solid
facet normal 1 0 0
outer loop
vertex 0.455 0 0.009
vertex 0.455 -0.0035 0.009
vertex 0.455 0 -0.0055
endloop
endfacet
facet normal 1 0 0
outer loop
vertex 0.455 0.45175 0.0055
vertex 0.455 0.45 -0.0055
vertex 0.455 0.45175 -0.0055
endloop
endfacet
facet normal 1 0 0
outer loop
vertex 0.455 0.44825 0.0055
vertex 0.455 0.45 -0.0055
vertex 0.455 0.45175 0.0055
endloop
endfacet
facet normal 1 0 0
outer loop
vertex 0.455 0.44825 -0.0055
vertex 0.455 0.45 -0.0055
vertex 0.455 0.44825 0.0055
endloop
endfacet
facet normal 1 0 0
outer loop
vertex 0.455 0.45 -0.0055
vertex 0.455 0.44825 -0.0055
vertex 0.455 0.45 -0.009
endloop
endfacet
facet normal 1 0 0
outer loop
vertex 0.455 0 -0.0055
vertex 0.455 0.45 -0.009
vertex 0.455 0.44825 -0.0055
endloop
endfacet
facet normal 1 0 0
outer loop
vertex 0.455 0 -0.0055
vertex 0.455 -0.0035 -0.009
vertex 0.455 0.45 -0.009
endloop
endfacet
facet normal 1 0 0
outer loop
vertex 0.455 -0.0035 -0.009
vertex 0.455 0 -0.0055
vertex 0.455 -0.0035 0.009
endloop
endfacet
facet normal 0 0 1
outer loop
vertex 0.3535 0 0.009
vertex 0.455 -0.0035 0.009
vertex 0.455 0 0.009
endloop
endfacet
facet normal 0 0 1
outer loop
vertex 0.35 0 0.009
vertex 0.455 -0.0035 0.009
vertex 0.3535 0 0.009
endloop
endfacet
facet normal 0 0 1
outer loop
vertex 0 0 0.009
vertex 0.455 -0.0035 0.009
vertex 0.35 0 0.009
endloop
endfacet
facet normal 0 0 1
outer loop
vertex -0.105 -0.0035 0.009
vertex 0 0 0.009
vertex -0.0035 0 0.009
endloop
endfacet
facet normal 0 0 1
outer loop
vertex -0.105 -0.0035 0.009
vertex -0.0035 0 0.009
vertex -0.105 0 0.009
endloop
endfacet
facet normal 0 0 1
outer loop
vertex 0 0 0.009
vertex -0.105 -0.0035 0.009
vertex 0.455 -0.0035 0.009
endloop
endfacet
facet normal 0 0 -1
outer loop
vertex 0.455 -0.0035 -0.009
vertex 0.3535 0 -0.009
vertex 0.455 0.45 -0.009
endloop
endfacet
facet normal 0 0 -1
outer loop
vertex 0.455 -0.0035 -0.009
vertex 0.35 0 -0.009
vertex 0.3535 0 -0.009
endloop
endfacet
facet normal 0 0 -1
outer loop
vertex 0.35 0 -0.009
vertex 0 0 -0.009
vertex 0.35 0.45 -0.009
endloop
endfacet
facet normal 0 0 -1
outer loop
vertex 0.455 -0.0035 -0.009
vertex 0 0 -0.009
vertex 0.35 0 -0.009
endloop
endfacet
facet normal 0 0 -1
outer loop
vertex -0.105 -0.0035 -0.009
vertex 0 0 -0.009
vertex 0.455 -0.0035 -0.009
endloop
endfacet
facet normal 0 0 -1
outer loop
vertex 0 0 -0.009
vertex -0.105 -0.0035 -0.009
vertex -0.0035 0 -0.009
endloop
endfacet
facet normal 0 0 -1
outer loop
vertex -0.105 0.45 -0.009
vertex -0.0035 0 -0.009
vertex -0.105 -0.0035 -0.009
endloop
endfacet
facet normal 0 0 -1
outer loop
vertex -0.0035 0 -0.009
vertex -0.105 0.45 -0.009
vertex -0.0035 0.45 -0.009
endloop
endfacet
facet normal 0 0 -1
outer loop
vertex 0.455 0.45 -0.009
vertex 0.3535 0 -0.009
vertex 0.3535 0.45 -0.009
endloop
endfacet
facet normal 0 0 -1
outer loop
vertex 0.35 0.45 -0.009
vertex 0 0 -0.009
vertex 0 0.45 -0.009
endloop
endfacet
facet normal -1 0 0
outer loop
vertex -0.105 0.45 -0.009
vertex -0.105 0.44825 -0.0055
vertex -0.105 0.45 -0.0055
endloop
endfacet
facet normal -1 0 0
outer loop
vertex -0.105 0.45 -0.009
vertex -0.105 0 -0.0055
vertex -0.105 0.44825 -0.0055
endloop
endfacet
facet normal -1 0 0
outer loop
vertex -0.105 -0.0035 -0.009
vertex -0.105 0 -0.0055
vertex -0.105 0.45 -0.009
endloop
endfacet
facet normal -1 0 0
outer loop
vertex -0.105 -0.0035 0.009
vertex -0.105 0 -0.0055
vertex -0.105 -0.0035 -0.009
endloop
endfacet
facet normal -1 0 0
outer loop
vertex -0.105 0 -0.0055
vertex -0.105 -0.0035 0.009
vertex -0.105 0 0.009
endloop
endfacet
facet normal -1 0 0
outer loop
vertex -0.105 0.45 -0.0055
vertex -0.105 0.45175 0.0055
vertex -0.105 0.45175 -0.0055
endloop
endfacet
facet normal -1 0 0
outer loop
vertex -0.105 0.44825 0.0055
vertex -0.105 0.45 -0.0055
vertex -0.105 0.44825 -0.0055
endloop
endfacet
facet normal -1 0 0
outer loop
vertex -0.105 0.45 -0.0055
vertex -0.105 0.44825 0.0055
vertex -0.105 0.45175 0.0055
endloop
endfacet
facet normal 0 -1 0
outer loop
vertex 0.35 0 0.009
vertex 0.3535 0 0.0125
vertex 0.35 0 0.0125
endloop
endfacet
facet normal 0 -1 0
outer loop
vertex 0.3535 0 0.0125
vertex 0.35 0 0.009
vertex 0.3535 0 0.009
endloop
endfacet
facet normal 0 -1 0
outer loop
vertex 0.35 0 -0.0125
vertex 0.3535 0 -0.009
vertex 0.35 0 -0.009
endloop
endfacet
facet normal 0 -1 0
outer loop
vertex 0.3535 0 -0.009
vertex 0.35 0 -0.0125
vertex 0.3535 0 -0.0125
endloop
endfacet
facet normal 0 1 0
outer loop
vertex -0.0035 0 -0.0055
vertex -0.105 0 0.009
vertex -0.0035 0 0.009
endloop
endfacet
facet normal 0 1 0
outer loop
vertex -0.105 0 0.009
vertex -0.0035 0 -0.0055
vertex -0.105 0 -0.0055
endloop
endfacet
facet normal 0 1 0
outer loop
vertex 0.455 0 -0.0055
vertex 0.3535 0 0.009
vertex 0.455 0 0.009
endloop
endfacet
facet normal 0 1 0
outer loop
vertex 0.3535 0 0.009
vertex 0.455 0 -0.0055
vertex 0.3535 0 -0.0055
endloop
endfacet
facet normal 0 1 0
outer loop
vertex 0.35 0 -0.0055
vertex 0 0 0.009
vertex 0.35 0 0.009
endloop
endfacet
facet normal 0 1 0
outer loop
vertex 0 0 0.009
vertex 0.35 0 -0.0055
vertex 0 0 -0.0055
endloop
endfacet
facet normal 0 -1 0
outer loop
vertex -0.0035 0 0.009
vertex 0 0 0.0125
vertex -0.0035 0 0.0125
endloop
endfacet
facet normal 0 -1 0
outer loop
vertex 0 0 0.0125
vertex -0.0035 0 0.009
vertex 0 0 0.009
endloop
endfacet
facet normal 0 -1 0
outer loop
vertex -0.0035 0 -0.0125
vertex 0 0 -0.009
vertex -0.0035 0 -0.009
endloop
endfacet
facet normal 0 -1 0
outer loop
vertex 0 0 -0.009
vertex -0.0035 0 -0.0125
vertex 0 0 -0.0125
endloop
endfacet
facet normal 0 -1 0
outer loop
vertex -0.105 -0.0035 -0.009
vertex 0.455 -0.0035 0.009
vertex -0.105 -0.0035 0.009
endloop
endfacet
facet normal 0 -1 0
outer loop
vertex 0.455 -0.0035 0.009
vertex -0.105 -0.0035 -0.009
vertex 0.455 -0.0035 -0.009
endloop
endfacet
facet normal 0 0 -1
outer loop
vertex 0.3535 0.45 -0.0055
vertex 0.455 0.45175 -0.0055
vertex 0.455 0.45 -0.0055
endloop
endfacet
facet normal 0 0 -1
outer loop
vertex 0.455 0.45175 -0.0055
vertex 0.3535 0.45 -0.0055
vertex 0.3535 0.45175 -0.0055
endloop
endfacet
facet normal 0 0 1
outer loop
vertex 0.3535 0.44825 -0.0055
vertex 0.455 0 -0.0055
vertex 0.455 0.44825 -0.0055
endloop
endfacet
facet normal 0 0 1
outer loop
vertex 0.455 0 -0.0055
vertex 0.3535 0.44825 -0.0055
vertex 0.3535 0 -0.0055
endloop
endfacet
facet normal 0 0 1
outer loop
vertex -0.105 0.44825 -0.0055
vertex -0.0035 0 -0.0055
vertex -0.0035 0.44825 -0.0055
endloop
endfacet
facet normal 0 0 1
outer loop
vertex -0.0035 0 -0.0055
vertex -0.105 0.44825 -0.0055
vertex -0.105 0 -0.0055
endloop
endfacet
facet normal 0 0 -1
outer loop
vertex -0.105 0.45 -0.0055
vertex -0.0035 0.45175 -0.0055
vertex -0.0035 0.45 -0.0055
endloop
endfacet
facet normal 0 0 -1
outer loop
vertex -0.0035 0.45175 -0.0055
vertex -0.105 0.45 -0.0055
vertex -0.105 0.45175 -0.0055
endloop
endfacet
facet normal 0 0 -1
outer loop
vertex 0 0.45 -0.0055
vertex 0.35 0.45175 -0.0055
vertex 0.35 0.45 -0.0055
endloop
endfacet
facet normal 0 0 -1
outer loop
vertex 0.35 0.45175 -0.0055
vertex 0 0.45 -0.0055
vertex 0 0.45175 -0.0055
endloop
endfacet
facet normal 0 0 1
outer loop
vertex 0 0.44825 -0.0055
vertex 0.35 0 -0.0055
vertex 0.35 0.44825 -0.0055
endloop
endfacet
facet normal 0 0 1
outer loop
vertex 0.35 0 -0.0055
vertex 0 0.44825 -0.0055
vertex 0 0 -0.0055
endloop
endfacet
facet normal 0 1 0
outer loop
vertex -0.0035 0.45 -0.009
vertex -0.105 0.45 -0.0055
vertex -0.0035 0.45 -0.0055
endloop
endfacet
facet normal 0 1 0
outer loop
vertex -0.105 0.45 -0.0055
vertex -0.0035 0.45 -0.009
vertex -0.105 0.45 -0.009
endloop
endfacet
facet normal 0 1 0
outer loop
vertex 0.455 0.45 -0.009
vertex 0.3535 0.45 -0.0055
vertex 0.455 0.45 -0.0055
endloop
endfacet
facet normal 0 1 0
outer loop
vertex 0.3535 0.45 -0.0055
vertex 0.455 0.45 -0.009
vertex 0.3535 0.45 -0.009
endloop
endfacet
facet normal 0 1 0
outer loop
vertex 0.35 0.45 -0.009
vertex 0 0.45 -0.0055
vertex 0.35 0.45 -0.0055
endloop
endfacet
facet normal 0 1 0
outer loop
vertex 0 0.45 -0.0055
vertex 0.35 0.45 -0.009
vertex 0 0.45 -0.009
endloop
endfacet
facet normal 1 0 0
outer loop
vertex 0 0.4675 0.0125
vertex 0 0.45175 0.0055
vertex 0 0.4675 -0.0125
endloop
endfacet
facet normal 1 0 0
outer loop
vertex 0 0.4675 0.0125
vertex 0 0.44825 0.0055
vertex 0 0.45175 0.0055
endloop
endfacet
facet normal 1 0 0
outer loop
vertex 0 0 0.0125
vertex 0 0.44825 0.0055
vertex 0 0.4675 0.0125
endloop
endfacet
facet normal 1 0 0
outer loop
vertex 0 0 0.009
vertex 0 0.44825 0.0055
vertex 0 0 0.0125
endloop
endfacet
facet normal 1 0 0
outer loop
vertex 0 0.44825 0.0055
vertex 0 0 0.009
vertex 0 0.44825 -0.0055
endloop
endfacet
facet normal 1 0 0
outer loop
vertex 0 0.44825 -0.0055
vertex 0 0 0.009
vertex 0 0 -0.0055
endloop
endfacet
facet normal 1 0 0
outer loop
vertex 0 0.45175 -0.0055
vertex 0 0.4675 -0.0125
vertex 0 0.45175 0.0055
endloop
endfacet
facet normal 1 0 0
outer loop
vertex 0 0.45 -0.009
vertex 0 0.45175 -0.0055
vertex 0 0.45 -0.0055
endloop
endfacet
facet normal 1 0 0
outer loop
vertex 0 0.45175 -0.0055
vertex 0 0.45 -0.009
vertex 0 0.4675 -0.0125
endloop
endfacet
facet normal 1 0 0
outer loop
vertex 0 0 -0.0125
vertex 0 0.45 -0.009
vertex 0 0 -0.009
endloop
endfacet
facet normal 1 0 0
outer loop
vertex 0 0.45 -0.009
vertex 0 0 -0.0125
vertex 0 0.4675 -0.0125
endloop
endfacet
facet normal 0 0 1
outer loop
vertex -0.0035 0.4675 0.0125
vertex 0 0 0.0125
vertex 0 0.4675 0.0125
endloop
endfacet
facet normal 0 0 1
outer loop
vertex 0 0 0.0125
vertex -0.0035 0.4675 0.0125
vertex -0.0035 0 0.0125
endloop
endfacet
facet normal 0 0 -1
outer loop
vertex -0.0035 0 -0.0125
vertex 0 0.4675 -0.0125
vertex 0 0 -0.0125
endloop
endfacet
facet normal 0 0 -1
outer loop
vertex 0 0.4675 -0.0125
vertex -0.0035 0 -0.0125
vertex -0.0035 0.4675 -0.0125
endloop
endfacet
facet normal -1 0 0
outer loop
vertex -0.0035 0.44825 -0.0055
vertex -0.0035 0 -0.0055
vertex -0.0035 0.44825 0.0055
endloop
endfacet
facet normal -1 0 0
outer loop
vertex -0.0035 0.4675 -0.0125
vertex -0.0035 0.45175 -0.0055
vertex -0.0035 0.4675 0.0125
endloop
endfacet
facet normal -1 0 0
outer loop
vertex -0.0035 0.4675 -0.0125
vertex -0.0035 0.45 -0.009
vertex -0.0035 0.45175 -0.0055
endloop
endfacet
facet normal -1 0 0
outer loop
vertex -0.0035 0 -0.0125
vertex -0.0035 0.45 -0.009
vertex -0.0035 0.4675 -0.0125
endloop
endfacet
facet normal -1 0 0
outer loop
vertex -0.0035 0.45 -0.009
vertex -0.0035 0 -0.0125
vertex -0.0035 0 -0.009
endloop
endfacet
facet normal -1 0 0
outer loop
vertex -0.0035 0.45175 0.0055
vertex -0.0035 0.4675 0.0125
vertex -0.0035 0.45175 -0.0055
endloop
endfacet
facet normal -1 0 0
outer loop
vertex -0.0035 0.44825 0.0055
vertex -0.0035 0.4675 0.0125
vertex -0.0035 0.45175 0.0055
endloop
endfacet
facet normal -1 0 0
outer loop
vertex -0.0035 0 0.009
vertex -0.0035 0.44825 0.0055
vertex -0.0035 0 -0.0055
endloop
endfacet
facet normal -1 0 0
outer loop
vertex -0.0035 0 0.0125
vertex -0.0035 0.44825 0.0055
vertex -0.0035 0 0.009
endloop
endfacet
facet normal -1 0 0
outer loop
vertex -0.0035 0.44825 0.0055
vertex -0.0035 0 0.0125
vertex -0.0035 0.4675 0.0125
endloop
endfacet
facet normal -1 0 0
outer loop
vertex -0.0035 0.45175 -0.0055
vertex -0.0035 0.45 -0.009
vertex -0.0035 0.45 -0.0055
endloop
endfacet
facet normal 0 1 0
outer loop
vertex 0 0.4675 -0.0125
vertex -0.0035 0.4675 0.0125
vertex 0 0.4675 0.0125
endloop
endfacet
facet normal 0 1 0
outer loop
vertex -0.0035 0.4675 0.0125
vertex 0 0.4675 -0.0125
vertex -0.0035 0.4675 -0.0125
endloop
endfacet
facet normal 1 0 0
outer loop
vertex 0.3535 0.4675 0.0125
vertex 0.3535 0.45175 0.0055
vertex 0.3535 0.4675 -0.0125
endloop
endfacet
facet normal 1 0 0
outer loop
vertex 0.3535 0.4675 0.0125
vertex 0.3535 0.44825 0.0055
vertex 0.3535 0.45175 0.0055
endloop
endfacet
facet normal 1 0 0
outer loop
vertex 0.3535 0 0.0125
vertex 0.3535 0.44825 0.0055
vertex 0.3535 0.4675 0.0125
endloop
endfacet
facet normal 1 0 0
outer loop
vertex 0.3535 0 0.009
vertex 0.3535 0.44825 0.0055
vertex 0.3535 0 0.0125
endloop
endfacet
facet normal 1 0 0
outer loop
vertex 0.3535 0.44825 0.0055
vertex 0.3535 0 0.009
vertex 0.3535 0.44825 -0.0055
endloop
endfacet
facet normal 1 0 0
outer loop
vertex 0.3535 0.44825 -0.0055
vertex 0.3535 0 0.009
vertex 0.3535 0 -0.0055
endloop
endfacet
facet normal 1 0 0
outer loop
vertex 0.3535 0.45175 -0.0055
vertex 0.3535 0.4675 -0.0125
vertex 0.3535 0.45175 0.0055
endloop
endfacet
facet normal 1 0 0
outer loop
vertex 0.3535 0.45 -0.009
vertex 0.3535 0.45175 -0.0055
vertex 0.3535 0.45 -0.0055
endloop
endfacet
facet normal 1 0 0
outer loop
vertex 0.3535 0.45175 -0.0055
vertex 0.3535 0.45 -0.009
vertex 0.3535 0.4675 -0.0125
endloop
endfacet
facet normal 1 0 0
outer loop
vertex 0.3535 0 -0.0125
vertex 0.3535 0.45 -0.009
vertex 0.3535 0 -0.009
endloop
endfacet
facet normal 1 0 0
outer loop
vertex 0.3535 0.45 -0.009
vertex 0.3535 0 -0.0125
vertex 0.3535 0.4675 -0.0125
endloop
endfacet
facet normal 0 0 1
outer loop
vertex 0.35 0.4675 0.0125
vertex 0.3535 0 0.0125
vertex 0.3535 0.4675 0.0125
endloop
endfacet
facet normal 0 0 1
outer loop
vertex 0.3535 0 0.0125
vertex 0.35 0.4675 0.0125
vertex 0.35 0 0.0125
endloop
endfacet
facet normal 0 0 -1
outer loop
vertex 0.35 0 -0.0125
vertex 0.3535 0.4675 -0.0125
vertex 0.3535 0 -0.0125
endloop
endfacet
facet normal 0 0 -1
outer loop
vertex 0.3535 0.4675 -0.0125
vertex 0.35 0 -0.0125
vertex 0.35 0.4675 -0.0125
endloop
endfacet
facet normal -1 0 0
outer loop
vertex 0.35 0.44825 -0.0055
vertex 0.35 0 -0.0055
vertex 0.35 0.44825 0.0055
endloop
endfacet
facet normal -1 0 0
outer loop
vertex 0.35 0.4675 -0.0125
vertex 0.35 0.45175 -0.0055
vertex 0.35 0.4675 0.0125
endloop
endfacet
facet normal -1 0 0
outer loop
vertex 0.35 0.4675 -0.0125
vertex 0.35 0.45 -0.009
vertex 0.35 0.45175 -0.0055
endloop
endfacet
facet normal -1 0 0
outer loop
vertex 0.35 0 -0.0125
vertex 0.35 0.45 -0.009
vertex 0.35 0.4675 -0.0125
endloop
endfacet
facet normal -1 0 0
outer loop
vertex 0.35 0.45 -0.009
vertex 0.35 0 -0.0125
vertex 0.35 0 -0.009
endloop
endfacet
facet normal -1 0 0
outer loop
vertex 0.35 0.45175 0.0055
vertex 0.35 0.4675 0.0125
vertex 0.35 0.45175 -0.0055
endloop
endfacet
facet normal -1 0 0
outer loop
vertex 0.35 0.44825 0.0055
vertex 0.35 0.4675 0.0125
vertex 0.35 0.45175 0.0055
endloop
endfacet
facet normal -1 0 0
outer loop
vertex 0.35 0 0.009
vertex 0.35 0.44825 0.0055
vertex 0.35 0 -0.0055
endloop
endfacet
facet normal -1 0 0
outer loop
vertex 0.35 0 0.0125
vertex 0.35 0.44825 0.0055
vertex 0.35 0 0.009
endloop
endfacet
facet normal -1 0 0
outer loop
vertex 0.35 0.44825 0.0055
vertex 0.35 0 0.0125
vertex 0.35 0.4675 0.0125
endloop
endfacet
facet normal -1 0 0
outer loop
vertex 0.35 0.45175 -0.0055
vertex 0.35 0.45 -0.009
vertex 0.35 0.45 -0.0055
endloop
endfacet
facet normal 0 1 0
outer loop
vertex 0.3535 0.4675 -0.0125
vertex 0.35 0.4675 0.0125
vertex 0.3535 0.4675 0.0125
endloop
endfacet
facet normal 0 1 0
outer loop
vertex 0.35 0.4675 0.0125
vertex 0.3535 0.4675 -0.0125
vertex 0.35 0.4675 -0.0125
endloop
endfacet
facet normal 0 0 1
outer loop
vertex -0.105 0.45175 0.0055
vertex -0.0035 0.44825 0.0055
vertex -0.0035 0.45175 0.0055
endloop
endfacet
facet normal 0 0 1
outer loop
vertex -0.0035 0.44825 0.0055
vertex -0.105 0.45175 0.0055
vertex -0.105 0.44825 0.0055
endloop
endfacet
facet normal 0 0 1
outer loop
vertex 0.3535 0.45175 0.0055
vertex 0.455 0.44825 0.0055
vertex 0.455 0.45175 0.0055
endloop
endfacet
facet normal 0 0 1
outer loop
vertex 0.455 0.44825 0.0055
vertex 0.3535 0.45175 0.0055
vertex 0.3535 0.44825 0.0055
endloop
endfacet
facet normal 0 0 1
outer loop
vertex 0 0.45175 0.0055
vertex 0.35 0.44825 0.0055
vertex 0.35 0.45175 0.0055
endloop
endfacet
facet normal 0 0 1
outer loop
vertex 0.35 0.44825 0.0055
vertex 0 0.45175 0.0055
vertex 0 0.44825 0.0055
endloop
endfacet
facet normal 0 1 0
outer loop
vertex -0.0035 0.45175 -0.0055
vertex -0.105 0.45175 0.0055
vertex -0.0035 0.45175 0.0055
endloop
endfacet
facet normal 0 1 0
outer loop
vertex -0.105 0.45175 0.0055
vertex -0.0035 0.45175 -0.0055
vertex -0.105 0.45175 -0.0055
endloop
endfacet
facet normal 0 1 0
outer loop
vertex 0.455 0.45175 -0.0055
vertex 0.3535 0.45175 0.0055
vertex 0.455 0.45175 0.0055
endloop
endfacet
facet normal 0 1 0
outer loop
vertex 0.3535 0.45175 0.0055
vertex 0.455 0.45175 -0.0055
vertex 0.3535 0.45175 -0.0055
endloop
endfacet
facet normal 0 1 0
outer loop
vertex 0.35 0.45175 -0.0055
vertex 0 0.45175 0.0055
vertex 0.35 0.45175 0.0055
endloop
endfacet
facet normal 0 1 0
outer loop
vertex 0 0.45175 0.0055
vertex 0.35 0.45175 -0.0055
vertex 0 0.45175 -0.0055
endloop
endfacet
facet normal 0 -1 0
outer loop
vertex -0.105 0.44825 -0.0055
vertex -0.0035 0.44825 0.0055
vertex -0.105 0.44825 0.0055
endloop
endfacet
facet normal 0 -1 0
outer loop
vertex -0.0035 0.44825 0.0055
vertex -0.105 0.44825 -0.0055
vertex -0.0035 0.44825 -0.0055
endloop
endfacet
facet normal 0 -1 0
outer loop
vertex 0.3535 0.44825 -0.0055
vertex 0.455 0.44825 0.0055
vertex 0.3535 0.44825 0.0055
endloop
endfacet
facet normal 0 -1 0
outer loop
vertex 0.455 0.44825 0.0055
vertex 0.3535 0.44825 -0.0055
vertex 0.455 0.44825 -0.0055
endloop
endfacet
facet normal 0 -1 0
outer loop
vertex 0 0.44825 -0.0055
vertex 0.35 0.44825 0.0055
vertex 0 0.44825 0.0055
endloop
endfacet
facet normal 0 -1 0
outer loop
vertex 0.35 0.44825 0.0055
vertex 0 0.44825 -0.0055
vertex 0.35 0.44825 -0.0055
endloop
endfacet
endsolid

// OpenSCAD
mode = 0;py1=-0;py2=0;pz=-0;

//Dimension : principal box
v=0.011;//'void widith;  x
l=0.35; //box length;  y
h=0.45; //box height;  z
e=0.01*l;
//Value needed to centralise figure in x
val=(v+2*e)/2;

//Floor
module bot() {
translate([-0.3*l,-e,-val]) 
    cube([l*1.6,e,v+2*e]);
    }
//Glass
module glass1() {
translate([-0.3*l ,0,-val]) 
    color("blue") 
    cube([l*1.6,h,e]);
    }
module glass2() {
translate([-0.3*l,0,e+v-val]) 
    color("blue") 
    cube([l*1.6,h,e]);
    }
//Pression lateral1 mov y+
module pistY1() {
translate([-e ,0,-e-val]) 
    color("red") 
    cube([e, h+5*e,v+4*e]);
    }
//Pression lateral2 mov y-
module pistY2() {
translate([l ,0,-val-e]) 
    color("red") 
    cube([e, h+5*e,v+4*e]);
    }
//Pression vertical mov z-
module pistZ() {
translate([l/2 ,h,e+v/2-val]) 
    color("red") 
    cube([1.6*l, e,v], true); 
}
 module insertHelper() {
translate([l/2 ,3*h/2,e+v/2-val]) 
difference() {

    color("red") 
    cube([l*1.6, h,v*1.4], true);
        color("red") 
        cube([l, 2*h,v], true);
    }
}
module all(){
    bot();
    glass1();
    //glass2();
    pistY1();
    pistY2();
    pistZ();
    //insertHelper(); 
}
if (mode==1){
    bot();
}else if (mode==21){
    glass1();
}else if (mode==22){
    glass2();
}else if (mode==31){
    pistY1();
}else if (mode==32){
    pistY2();
}else if (mode==4){
    pistZ();
}else if (mode==5){
    insertHelper(); 

}else{
    all();
}
